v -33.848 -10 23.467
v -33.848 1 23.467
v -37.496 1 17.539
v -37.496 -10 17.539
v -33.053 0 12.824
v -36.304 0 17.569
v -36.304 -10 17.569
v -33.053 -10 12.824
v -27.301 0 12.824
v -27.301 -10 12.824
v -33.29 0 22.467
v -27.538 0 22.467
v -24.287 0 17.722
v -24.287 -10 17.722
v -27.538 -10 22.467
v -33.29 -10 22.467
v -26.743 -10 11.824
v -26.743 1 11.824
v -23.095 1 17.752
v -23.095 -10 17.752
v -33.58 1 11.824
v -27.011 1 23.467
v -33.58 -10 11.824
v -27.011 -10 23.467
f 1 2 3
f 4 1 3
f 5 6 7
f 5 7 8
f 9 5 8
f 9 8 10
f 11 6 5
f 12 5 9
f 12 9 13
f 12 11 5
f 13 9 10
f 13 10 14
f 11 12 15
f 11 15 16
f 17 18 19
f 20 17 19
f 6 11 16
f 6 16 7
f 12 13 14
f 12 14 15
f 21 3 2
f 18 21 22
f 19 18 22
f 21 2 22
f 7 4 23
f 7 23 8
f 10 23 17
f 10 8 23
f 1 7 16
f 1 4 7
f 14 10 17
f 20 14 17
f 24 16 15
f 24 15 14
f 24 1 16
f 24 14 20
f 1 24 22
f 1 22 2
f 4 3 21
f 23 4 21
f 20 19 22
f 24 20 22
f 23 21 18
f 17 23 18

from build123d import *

# Parameters (mm, degrees)
F1_DEPTH = 10
F2_T     = 1


with BuildPart() as f1:
    # F0 (on Front) → F1 (new body)
    with BuildSketch(Plane.XZ):
        Polygon((-33.2895902376, 22.4671012992), (-36.3039637367, 17.568745036), (-33.0530058498, 12.8241044288), (-27.3014546092, 12.8241044288), (-24.2870811101, 17.7224606921), (-27.538038997, 22.4671012992), align=None)
    extrude(amount=F1_DEPTH)

    # F2
    f2_openings = [f1.faces().sort_by_distance(p)[0] for p in [
        (-30.295522, -10, 17.645603),
    ]]
    offset(amount=F2_T, openings=f2_openings, kind=Kind.INTERSECTION)


solid = f1.part
